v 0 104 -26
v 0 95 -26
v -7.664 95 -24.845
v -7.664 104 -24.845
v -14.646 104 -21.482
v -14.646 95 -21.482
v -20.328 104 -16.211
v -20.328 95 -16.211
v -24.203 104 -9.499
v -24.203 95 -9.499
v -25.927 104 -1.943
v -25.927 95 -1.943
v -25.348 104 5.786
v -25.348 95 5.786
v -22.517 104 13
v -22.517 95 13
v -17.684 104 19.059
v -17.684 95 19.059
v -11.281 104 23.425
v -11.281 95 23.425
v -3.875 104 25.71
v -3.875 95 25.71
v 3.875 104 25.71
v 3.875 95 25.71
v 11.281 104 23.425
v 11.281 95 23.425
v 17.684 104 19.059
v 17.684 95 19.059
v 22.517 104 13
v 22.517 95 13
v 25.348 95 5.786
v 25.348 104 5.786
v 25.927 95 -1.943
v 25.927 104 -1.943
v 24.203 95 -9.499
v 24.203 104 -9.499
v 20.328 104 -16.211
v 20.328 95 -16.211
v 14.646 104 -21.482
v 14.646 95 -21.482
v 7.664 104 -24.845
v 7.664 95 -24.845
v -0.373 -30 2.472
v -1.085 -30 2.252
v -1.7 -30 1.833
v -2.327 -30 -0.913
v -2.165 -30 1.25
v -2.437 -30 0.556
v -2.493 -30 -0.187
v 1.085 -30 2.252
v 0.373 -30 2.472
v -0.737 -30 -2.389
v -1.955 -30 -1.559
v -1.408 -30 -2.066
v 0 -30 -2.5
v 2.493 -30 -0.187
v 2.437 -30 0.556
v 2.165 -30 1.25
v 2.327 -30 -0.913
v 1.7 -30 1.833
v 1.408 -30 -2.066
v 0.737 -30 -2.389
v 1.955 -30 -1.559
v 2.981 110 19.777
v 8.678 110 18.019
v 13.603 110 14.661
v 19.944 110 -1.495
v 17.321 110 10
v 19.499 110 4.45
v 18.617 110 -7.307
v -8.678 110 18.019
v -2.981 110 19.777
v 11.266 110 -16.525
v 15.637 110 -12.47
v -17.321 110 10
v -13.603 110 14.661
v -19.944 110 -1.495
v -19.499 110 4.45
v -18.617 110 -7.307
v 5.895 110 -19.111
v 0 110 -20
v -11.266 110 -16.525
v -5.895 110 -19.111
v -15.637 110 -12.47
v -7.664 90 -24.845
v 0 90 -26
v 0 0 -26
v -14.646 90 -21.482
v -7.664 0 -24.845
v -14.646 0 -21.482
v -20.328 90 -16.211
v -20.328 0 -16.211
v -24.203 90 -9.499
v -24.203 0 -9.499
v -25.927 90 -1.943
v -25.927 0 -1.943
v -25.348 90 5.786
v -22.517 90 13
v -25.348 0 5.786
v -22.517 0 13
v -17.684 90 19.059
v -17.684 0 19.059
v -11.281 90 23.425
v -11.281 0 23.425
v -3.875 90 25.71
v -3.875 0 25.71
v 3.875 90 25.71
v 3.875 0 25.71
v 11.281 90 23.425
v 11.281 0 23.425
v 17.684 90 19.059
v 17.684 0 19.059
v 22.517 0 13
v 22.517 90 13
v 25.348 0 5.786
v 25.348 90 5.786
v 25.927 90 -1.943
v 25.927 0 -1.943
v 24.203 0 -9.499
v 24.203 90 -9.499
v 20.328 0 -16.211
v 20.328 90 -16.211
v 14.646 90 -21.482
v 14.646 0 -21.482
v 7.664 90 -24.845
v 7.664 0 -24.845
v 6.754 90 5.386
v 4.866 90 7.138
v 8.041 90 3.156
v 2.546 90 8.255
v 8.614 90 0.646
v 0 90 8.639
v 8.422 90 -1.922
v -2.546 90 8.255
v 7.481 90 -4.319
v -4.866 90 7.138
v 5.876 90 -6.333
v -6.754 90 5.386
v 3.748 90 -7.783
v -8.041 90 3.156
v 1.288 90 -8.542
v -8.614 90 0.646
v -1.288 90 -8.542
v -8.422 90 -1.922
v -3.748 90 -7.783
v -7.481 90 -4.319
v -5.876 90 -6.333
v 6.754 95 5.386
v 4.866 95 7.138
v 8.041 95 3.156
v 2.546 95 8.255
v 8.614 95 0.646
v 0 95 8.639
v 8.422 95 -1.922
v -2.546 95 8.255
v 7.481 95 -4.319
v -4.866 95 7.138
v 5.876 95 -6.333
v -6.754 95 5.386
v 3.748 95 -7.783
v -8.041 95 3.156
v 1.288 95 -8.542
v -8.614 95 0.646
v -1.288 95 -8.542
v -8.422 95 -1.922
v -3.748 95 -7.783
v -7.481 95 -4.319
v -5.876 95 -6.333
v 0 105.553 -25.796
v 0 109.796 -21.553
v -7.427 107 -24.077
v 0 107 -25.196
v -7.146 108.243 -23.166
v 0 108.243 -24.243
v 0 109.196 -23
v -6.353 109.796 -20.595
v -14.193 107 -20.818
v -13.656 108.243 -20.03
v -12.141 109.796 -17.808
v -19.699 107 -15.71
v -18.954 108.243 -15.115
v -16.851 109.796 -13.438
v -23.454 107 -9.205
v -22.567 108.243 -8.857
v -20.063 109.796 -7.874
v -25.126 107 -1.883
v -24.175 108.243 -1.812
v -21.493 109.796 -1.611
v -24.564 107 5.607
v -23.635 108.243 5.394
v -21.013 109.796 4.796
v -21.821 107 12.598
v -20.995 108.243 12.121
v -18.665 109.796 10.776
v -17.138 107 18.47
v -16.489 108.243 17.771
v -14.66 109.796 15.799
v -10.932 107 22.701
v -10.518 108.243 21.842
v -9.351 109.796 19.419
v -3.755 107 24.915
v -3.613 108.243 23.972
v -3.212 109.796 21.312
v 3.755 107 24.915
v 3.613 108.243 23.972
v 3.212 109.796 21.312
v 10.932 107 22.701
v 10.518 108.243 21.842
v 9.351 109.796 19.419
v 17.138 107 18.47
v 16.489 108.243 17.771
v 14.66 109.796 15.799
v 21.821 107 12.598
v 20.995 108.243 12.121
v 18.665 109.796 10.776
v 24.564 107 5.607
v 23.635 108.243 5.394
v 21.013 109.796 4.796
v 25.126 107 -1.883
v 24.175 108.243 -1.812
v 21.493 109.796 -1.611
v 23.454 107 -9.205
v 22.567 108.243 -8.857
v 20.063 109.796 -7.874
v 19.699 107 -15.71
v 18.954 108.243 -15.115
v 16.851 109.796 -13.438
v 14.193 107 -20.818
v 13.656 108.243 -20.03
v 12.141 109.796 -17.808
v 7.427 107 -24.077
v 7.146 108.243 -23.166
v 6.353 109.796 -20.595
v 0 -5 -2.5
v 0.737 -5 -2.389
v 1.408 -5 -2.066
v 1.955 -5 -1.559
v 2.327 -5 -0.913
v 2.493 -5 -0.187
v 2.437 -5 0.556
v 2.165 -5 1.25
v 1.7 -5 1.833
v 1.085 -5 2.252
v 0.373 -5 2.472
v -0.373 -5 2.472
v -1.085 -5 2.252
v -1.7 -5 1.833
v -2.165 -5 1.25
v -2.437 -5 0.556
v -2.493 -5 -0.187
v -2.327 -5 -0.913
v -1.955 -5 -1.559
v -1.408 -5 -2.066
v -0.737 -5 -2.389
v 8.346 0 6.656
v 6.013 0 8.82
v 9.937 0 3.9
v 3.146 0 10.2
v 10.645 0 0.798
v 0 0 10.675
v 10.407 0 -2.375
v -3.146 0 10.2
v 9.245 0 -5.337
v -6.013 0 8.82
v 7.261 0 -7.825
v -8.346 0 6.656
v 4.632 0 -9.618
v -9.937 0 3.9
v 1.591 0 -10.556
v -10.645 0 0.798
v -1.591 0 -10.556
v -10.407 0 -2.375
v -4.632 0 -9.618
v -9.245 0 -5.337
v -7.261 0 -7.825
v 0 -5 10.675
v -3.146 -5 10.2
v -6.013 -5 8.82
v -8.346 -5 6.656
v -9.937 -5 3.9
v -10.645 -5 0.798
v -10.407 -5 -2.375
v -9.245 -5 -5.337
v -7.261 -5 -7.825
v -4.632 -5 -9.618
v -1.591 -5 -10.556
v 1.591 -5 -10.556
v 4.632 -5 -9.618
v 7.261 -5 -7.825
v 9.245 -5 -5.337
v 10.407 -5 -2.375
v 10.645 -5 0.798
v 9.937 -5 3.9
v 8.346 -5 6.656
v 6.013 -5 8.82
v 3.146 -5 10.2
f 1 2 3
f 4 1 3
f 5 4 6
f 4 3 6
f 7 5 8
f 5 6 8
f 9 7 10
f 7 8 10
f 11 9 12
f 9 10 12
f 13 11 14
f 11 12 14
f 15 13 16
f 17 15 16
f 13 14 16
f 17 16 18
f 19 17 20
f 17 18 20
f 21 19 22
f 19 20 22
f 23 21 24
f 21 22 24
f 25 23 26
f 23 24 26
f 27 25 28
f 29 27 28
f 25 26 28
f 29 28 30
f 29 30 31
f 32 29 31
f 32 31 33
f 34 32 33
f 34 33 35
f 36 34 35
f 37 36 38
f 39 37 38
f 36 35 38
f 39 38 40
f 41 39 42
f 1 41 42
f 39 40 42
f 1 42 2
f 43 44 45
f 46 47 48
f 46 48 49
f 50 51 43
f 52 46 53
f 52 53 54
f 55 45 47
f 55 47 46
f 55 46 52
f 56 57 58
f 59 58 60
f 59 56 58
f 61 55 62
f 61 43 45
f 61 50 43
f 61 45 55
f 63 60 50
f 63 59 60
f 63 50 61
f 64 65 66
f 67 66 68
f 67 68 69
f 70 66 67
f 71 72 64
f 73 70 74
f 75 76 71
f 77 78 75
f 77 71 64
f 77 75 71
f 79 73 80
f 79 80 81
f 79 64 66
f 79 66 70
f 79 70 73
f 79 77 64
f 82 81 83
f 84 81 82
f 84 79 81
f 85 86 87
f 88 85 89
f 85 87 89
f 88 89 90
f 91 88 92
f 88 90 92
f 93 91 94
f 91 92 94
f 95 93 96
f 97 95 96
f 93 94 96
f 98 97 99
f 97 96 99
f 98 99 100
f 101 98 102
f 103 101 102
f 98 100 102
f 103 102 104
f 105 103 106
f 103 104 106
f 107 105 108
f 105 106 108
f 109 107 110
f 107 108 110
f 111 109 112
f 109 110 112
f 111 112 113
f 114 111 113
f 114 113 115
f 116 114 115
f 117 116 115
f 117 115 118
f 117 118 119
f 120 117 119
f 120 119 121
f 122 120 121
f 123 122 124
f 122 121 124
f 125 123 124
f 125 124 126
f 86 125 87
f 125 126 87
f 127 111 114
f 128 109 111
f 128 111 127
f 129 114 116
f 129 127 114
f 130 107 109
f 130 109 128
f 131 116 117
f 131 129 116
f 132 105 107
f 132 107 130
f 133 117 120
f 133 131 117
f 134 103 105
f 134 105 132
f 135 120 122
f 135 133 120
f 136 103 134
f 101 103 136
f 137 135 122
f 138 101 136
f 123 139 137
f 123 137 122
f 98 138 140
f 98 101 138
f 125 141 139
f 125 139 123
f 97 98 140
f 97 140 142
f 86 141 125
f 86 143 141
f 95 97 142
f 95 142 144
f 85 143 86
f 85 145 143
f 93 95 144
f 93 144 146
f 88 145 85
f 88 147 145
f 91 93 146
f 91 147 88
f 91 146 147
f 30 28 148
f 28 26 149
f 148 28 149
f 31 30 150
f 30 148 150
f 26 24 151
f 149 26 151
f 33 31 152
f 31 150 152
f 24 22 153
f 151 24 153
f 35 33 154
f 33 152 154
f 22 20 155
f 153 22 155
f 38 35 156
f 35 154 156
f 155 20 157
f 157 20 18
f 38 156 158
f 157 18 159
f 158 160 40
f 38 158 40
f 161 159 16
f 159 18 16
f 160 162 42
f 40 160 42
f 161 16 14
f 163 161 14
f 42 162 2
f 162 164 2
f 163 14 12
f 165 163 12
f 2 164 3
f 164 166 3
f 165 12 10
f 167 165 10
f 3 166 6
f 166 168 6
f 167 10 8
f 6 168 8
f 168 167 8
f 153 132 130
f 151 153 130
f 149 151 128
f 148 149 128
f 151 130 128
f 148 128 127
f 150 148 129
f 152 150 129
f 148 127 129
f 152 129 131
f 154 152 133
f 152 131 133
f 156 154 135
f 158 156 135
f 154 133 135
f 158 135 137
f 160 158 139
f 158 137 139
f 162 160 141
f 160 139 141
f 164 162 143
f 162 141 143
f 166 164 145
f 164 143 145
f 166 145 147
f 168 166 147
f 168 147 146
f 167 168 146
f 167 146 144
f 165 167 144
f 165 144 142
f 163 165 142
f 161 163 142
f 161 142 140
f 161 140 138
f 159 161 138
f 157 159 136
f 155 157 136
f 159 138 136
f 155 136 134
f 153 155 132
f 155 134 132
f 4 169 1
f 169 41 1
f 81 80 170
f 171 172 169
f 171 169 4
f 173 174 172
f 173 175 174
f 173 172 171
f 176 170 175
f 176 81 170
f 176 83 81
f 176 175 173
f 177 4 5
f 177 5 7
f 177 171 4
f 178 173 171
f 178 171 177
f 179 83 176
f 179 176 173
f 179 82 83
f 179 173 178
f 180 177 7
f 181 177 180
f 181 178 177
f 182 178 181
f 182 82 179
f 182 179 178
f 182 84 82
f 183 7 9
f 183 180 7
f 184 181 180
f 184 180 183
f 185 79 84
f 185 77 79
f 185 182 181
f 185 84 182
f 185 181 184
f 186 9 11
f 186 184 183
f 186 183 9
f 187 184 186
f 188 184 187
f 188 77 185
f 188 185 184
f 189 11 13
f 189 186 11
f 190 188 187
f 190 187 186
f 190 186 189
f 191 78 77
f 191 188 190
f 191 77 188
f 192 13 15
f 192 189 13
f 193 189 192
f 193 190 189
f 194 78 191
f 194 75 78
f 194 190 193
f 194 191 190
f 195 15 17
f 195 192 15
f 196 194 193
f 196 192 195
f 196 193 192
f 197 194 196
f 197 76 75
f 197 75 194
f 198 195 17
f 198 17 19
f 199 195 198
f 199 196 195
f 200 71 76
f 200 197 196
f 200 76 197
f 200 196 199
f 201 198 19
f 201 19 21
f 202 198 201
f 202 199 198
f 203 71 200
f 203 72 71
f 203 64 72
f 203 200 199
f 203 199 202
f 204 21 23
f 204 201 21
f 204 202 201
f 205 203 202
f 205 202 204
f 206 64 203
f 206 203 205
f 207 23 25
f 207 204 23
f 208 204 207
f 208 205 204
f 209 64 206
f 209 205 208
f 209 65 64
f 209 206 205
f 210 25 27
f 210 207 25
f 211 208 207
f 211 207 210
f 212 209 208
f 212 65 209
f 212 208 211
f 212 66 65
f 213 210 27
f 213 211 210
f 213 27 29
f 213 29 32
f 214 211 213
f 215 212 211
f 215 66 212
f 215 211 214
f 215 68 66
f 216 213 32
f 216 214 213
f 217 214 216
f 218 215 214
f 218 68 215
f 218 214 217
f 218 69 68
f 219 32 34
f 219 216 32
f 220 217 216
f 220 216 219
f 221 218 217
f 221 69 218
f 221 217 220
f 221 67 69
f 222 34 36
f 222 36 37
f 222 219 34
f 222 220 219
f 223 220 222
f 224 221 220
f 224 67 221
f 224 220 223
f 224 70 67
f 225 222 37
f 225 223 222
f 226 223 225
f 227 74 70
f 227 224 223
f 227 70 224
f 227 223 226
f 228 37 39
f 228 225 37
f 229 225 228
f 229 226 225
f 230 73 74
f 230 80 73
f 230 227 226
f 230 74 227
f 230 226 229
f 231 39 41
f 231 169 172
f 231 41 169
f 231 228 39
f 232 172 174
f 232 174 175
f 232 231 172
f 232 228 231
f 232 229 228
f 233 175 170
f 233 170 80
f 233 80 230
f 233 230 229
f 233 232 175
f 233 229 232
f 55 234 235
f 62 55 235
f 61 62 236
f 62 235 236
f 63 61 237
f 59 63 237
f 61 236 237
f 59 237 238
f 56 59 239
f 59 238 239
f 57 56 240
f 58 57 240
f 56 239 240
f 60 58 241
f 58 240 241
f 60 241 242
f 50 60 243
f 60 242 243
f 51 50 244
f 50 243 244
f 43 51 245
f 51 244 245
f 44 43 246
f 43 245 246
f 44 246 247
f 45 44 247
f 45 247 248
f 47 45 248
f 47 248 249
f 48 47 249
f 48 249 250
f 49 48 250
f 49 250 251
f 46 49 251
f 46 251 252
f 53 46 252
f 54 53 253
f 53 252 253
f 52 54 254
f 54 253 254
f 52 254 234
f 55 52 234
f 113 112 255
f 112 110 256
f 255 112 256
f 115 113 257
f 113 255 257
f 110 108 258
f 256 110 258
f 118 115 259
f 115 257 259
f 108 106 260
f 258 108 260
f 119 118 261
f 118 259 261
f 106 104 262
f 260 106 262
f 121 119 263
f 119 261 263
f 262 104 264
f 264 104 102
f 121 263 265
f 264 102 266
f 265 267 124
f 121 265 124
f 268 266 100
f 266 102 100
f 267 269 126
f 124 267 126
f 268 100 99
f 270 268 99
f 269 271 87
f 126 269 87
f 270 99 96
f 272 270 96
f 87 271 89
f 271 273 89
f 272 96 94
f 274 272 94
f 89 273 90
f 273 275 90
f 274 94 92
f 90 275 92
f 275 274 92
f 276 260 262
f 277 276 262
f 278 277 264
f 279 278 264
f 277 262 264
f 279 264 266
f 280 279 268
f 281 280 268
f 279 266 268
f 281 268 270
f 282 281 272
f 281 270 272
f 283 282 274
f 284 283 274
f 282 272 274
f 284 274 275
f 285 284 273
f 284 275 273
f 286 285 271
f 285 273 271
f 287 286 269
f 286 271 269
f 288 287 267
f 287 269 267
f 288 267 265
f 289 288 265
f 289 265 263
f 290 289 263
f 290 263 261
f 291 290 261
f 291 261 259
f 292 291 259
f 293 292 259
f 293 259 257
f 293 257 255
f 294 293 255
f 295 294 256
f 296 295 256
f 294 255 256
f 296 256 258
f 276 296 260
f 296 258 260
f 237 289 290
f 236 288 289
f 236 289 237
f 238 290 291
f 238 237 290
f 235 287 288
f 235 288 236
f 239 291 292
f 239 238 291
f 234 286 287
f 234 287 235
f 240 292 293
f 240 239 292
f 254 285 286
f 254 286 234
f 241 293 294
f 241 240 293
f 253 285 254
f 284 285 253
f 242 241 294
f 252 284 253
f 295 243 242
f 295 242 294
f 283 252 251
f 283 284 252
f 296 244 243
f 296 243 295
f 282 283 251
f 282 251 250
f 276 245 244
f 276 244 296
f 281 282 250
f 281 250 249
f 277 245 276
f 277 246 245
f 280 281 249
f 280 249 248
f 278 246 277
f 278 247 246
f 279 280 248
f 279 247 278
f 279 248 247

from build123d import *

# Parameters (mm, degrees)
SKETCH1_R           = 26
BOSS_EXTRUDE1_DEPTH = 90
SKETCH2_R           = 8.638646247
BOSS_EXTRUDE2_DEPTH = 5
SKETCH3_R           = 26
BOSS_EXTRUDE3_DEPTH = 15
SKETCH4_R           = 10.67473996
BOSS_EXTRUDE4_DEPTH = 5
SKETCH5_R           = 2.5
BOSS_EXTRUDE5_DEPTH = 25
FILLET1_R           = 6


with BuildPart() as part:
    # Sketch1 → Boss-Extrude1 (new body)
    with BuildSketch(Plane(origin=(0, 0, 0), x_dir=(1, 0, 0), z_dir=(0, 1, 0))):
        with Locations(Location((0, 0, 0), (0, 0, 90))):
            Circle(SKETCH1_R)
    extrude(amount=BOSS_EXTRUDE1_DEPTH)

    # Sketch2 → Boss-Extrude2 (add)
    with BuildSketch(Plane(origin=(0, 90, 0), x_dir=(1, 0, 0), z_dir=(0, 1, 0))):
        with Locations(Location((0, 0, 0), (0, 0, 270))):
            Circle(SKETCH2_R)
    extrude(amount=BOSS_EXTRUDE2_DEPTH)

    # Sketch3 → Boss-Extrude3 (add)
    with BuildSketch(Plane(origin=(0, 95, 0), x_dir=(1, 0, 0), z_dir=(0, 1, 0))):
        with Locations(Location((0, 0, 0), (0, 0, 90))):
            Circle(SKETCH3_R)
    extrude(amount=BOSS_EXTRUDE3_DEPTH)

    # Sketch4 → Boss-Extrude4 (add)
    with BuildSketch(Plane.XZ):
        with Locations(Location((0, 0, 0), (0, 0, 90))):
            Circle(SKETCH4_R)
    extrude(amount=BOSS_EXTRUDE4_DEPTH)

    # Sketch5 → Boss-Extrude5 (add)
    with BuildSketch(Plane.XZ.offset(5)):
        with Locations(Location((0, 0, 0), (0, 0, 270))):
            Circle(SKETCH5_R)
    extrude(amount=BOSS_EXTRUDE5_DEPTH)

    # Fillet1
    fillet1_edges = [part.edges().sort_by_distance(p)[0] for p in [
        (0, 110, 26),
    ]]
    fillet(fillet1_edges, radius=FILLET1_R)


solid = part.part
